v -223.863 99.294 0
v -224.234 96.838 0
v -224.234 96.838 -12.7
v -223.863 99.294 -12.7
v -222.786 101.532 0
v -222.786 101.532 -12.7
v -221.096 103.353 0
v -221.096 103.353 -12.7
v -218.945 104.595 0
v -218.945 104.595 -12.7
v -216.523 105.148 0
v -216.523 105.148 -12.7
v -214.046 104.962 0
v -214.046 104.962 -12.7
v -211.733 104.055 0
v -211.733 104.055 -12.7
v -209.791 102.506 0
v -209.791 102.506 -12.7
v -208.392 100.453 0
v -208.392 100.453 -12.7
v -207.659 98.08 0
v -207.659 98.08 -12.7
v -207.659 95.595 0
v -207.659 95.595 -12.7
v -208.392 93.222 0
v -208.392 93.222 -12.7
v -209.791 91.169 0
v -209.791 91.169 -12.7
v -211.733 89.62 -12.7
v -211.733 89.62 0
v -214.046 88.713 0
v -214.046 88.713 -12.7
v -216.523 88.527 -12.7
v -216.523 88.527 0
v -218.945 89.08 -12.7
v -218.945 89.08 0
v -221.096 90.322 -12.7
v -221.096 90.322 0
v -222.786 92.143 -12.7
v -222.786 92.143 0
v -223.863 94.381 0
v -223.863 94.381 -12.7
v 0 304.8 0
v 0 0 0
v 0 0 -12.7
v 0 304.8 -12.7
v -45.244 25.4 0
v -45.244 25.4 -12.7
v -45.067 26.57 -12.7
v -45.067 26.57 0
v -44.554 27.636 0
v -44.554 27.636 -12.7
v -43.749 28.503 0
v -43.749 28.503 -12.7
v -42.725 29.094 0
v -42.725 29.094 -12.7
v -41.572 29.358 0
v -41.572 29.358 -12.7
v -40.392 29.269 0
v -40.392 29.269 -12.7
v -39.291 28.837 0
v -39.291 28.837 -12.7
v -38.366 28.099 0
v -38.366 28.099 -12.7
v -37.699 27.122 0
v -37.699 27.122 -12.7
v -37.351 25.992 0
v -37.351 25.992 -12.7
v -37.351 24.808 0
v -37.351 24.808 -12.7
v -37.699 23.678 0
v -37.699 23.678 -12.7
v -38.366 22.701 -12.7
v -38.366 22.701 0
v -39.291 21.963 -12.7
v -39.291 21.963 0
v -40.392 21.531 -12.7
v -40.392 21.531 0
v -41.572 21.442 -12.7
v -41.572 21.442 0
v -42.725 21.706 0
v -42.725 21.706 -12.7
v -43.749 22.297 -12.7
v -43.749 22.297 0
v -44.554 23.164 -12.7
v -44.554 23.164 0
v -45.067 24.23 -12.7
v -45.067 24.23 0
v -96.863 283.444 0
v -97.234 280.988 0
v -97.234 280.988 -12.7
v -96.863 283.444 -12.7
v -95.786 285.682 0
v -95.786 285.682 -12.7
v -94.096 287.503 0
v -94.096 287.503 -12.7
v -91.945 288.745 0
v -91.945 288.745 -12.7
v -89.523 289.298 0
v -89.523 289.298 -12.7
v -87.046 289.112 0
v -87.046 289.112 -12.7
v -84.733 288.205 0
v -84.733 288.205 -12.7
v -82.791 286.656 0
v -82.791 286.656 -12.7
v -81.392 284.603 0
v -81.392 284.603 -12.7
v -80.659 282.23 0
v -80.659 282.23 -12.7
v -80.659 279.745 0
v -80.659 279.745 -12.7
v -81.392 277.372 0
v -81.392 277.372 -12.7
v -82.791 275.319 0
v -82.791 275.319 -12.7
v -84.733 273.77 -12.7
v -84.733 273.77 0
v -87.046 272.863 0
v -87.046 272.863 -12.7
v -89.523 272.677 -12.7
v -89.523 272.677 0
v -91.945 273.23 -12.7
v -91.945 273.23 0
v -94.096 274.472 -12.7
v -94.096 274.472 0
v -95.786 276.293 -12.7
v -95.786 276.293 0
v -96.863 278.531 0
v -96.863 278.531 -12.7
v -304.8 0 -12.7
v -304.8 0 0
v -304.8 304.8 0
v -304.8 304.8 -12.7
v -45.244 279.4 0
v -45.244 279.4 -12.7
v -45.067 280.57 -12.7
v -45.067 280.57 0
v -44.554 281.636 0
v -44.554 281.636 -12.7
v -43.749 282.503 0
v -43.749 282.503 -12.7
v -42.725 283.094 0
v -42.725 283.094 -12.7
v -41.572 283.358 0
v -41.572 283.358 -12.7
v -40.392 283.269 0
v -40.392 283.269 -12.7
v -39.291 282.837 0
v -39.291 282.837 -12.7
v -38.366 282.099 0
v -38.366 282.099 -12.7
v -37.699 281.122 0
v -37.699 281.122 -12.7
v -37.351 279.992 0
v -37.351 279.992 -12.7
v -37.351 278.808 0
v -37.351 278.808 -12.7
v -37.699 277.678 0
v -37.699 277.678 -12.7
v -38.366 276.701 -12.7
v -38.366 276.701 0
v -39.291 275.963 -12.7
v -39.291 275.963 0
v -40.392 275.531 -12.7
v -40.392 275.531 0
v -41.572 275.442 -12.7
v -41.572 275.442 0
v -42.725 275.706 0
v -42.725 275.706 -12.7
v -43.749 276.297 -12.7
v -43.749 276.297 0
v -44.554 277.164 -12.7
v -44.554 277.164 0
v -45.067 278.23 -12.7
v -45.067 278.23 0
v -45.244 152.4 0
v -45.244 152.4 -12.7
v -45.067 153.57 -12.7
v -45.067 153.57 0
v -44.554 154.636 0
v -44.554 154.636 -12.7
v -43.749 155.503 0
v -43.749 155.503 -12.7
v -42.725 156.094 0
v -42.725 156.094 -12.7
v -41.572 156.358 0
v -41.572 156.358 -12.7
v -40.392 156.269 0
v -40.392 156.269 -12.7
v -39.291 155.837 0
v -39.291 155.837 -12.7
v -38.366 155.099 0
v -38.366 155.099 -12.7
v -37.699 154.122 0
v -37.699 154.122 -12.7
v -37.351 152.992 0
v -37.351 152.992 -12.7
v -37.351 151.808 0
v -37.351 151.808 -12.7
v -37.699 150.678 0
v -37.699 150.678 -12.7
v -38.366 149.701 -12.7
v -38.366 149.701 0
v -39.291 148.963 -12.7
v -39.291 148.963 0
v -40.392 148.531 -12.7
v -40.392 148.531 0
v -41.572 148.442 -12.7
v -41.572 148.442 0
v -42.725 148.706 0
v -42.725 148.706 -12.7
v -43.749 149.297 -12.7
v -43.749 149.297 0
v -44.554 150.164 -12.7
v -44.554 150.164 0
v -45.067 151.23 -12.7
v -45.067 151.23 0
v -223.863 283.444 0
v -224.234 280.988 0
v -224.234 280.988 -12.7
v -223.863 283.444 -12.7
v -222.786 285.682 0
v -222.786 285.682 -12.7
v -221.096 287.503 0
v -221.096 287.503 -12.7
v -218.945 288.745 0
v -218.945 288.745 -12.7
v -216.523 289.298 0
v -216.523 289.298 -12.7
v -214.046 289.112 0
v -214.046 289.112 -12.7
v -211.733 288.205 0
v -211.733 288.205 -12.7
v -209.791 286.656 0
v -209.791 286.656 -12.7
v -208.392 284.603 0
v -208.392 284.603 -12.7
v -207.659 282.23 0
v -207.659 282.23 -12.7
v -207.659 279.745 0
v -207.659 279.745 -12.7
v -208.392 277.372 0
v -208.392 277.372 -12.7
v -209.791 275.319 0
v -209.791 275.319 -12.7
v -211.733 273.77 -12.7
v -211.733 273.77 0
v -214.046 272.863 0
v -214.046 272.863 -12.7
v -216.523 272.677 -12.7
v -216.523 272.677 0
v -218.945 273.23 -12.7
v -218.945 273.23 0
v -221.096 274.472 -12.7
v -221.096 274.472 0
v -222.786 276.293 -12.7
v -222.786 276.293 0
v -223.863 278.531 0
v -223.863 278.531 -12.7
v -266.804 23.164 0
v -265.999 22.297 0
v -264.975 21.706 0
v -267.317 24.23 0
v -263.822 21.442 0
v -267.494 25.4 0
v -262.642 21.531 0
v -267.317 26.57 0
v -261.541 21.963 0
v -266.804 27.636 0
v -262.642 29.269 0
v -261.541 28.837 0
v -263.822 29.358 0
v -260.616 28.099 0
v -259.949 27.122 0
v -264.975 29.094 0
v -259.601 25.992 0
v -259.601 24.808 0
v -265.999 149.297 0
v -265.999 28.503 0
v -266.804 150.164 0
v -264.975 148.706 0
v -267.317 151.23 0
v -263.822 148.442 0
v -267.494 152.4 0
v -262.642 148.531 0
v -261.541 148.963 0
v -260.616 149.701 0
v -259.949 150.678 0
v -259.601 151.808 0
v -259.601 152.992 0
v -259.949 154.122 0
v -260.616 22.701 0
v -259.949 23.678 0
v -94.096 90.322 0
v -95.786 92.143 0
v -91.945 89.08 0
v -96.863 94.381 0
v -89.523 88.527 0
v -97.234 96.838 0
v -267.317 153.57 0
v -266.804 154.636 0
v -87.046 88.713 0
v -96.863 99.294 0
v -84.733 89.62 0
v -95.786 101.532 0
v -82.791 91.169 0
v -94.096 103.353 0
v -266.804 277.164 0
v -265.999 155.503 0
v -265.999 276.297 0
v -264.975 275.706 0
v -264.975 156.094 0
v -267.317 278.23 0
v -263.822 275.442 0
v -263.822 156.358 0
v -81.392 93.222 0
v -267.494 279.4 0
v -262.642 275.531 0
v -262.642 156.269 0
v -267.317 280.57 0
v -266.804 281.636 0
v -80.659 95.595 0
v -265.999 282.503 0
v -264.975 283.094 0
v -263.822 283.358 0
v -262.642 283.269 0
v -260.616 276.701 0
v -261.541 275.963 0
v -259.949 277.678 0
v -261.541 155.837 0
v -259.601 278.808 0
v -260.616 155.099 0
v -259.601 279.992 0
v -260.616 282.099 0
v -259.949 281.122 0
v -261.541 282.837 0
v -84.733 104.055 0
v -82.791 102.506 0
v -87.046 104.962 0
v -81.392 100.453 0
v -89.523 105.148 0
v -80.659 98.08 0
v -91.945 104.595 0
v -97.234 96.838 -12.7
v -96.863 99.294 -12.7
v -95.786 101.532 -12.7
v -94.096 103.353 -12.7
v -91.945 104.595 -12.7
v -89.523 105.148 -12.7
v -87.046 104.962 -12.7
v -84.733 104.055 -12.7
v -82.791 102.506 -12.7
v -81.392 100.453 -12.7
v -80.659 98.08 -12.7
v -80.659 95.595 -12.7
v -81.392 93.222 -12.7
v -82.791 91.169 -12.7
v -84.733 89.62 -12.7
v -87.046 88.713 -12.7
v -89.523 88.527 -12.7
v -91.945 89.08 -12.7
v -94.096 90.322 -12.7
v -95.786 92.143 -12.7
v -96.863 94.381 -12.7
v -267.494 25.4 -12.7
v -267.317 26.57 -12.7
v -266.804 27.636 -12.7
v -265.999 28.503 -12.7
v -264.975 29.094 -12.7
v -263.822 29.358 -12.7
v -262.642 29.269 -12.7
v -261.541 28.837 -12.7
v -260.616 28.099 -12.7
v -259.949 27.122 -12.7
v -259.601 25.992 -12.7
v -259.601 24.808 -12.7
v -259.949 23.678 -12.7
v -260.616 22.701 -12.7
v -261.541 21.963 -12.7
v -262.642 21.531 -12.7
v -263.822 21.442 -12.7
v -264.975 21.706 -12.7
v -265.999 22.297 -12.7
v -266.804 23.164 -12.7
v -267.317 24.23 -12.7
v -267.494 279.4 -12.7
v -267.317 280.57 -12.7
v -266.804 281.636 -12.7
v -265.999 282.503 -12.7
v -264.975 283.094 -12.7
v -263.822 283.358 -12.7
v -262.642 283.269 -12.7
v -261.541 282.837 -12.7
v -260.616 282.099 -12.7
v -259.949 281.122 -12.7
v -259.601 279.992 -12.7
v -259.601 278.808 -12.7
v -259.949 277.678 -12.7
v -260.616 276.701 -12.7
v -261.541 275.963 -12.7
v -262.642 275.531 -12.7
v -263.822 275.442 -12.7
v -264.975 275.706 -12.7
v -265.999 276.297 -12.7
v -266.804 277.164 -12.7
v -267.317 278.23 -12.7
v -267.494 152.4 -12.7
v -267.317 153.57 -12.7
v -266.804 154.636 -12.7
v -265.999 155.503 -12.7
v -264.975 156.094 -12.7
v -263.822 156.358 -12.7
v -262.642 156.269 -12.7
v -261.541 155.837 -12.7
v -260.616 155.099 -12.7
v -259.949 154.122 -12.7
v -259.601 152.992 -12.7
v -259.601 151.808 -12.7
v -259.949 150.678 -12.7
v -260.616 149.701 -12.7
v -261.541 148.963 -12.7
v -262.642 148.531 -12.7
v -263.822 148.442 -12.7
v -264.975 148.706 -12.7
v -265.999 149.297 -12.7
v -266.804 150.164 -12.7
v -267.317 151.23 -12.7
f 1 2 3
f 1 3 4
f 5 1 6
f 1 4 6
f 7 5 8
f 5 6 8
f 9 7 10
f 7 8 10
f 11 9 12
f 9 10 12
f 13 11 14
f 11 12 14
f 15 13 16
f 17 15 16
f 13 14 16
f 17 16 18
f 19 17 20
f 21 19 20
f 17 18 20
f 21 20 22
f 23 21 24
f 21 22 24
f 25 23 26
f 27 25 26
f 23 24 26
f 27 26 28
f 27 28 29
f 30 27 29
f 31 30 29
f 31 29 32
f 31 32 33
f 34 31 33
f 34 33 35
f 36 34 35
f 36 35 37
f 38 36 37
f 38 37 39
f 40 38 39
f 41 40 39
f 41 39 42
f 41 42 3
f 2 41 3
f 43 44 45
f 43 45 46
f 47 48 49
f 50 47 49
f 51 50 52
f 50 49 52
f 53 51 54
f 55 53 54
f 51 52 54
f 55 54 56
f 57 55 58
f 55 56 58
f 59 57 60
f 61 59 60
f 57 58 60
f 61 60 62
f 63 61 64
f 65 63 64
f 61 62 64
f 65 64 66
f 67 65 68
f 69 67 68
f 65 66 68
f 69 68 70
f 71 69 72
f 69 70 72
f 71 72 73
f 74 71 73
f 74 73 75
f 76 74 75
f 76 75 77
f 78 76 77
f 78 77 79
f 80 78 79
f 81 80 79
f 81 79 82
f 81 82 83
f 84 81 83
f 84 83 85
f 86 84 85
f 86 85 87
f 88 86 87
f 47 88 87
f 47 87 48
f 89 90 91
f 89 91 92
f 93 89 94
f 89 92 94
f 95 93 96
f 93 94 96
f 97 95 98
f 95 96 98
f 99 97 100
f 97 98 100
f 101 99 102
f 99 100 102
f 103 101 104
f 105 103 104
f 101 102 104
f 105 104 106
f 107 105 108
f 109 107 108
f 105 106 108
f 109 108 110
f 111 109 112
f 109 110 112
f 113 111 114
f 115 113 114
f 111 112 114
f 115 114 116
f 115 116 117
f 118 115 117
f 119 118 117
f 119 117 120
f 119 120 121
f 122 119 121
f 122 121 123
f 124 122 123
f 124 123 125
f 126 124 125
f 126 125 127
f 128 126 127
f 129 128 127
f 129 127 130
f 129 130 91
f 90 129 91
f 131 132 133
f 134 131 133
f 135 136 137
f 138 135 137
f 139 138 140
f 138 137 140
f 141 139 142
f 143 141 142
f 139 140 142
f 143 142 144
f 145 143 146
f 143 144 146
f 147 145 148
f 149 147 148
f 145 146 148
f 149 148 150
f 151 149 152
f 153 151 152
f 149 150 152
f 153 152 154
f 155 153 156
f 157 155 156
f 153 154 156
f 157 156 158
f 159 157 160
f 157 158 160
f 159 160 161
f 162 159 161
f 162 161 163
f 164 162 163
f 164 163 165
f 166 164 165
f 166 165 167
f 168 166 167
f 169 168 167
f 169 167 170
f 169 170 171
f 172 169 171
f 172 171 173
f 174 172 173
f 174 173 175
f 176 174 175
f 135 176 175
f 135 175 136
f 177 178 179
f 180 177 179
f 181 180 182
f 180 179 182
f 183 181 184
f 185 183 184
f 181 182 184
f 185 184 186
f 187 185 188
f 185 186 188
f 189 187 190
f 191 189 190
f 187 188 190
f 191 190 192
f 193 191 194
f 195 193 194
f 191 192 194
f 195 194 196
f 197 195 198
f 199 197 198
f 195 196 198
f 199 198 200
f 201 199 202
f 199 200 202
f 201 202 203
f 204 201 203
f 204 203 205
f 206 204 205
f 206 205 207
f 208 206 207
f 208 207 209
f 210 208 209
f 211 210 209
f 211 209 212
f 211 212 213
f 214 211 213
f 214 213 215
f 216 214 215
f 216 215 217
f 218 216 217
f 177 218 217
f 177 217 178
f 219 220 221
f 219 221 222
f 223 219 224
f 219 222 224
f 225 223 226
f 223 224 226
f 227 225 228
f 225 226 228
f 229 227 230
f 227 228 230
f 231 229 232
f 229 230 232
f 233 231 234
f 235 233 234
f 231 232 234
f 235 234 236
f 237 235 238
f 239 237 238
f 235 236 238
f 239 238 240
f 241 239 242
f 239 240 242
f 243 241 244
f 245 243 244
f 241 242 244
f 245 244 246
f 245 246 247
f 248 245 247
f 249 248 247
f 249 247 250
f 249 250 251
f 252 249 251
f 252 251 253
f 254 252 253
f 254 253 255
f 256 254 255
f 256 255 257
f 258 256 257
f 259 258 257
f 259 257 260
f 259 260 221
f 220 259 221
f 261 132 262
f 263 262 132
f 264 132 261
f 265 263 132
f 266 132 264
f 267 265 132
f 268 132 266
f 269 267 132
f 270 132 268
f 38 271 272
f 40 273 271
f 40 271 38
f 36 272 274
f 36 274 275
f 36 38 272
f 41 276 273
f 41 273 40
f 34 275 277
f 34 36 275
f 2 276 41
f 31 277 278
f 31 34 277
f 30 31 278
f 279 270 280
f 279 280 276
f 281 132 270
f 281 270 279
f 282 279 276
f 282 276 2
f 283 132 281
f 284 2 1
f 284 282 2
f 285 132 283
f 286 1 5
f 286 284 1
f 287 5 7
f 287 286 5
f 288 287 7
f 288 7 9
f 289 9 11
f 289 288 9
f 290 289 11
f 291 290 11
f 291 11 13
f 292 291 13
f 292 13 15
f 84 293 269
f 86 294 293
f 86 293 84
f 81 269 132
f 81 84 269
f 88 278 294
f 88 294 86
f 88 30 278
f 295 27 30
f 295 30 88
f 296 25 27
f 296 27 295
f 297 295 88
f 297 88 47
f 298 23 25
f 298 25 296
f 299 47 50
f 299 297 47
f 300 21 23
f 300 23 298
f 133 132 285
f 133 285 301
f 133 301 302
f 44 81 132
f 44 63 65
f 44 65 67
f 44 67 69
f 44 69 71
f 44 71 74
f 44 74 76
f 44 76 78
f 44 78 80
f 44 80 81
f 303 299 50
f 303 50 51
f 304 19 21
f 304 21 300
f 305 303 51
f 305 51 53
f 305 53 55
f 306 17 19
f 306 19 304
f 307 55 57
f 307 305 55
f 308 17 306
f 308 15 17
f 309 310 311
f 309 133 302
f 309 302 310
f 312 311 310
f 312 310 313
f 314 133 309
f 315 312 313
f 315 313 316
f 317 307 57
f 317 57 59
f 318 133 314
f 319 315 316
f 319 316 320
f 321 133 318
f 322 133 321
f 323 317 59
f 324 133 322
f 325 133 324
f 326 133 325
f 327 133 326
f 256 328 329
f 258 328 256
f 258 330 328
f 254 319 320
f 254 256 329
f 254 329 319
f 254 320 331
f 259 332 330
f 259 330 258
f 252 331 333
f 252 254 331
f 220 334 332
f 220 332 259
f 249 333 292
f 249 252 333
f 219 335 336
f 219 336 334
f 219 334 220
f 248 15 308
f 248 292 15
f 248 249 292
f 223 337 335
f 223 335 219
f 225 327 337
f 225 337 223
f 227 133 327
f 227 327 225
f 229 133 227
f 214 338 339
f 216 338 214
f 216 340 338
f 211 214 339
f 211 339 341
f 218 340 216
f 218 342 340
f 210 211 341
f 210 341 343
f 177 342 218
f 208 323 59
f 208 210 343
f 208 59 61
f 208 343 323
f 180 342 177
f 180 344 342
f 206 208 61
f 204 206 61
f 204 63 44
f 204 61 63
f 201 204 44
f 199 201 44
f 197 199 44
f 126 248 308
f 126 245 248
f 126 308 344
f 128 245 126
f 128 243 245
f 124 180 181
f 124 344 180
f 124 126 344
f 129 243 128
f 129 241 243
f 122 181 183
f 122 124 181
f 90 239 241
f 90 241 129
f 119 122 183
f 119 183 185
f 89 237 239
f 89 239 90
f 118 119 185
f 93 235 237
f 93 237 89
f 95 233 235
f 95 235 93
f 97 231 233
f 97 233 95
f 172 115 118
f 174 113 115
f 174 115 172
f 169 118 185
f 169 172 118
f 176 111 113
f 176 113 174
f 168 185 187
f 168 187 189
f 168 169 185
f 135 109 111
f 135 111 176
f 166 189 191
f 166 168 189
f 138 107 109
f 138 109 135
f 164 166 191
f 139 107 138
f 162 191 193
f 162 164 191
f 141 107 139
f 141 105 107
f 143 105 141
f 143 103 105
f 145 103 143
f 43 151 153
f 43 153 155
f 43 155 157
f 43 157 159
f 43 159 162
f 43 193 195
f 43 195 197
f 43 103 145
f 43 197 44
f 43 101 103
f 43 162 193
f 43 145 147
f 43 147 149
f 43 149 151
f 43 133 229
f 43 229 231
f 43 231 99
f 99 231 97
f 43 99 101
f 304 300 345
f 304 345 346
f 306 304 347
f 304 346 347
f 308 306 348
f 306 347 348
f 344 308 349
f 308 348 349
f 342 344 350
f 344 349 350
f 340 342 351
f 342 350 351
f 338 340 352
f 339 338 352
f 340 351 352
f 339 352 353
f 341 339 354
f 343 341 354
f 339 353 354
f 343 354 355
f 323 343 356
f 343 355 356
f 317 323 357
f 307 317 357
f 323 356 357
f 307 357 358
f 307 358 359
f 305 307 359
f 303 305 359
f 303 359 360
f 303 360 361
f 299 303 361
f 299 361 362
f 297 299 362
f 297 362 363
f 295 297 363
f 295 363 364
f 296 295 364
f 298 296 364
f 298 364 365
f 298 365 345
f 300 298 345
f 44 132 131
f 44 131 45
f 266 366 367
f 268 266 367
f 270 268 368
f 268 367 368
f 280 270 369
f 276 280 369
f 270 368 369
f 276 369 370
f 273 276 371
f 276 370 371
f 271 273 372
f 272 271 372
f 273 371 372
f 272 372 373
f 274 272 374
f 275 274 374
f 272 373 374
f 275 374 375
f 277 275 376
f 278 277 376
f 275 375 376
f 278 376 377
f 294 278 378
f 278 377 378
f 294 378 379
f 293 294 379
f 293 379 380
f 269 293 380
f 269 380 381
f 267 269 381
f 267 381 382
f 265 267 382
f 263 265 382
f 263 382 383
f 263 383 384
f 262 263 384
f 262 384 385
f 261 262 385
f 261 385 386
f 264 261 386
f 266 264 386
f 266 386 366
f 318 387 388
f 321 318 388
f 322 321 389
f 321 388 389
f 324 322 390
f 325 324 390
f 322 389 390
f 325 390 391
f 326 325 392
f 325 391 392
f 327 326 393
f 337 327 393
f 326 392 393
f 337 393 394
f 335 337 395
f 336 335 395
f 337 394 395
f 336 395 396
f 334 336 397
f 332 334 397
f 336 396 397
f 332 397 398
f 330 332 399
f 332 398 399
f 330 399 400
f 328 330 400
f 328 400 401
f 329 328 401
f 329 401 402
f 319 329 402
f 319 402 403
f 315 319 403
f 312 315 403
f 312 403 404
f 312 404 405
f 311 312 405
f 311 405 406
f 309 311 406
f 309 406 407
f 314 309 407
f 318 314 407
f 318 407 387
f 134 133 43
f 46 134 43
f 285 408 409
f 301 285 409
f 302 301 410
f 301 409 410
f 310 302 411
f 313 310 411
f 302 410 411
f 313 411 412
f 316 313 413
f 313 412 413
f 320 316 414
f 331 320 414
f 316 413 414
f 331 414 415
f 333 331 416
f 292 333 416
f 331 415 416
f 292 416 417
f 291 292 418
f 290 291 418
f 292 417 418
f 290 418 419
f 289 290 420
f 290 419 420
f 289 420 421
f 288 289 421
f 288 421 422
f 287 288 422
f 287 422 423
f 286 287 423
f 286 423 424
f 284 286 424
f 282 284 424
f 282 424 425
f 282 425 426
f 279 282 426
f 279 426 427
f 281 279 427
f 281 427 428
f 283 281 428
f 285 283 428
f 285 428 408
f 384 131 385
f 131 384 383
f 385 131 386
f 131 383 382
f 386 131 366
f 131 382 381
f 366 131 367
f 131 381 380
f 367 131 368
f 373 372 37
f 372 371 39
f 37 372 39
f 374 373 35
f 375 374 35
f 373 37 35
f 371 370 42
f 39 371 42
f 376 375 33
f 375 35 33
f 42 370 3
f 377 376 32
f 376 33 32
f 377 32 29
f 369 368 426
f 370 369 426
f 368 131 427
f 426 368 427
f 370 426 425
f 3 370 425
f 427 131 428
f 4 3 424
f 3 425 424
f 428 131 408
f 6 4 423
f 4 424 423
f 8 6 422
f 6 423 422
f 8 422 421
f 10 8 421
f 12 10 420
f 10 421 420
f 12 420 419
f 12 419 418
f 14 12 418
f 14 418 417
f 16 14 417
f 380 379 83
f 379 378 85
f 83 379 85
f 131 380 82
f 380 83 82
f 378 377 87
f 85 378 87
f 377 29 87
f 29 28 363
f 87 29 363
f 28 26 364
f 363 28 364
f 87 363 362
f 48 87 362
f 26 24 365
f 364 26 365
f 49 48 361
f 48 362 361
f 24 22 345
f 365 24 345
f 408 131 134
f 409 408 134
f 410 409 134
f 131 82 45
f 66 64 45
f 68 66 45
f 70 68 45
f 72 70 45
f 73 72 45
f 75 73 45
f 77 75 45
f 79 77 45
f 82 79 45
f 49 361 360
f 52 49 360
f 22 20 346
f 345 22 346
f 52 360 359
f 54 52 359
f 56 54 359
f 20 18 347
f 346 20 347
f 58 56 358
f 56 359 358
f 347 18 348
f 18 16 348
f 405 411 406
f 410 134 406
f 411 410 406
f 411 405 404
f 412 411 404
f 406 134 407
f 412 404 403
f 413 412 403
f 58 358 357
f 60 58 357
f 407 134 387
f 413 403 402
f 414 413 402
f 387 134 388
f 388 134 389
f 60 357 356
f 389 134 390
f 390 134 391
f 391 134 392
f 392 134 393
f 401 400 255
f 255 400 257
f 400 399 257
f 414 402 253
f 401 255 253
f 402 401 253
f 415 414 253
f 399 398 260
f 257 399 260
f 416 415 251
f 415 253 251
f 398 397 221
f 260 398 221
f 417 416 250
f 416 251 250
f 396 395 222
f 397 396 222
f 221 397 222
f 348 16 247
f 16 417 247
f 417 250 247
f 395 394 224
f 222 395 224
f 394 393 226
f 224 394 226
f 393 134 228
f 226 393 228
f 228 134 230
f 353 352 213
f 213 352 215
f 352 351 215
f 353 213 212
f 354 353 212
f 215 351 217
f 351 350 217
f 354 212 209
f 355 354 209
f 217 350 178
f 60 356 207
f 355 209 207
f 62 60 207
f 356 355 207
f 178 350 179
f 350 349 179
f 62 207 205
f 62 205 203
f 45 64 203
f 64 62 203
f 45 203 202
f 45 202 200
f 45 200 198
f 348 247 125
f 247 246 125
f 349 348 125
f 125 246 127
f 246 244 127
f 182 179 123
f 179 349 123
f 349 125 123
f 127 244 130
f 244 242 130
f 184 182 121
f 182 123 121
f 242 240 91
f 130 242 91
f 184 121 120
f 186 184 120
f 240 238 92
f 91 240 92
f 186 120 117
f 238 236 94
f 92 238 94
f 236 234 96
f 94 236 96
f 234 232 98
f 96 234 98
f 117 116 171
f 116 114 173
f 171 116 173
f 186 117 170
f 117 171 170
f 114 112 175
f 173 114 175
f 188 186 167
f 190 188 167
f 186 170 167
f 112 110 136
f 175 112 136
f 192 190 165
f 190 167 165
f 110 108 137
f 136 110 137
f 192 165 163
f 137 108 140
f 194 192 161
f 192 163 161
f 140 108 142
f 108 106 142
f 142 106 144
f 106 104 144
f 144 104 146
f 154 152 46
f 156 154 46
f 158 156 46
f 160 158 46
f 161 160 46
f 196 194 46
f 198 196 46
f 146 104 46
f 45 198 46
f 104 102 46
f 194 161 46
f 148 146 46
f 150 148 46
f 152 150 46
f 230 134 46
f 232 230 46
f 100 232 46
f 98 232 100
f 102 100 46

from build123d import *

# Parameters (mm, degrees)
F0_W     = 304.8
F0_H     = 304.8
F1_DEPTH = 12.7
F2_D     = 7.9375
F2_DEPTH = 20.6629
F2_TIP   = 2.3846655818
F3_D     = 16.66748
F3_DEPTH = 20.6756
F3_TIP   = 5.0074161752


with BuildPart() as f1:
    # F0 (on Top) → F1 (new body)
    with BuildSketch(Plane.XY):
        with Locations((-152.4, 152.4)):
            Rectangle(F0_W, F0_H)
    extrude(amount=-F1_DEPTH)

    # F2
    with Locations(Plane.XY):
        with Locations((-263.525, 279.4), (-263.525, 152.4), (-263.525, 25.4), (-41.275, 279.4), (-41.275, 152.4), (-41.275, 25.4)):
            Hole(F2_D / 2, depth=F2_DEPTH)
            with Locations((0, 0, -(F2_DEPTH + F2_TIP / 2))):  # 118° drill point
                Cone(0, F2_D / 2, F2_TIP, mode=Mode.SUBTRACT)

    # F3
    with Locations(Plane.XY):
        with Locations((-215.9, 280.9875), (-88.9, 280.9875), (-88.9, 96.8375), (-215.9, 96.8375)):
            Hole(F3_D / 2, depth=F3_DEPTH)
            with Locations((0, 0, -(F3_DEPTH + F3_TIP / 2))):  # 118° drill point
                Cone(0, F3_D / 2, F3_TIP, mode=Mode.SUBTRACT)


solid = f1.part
